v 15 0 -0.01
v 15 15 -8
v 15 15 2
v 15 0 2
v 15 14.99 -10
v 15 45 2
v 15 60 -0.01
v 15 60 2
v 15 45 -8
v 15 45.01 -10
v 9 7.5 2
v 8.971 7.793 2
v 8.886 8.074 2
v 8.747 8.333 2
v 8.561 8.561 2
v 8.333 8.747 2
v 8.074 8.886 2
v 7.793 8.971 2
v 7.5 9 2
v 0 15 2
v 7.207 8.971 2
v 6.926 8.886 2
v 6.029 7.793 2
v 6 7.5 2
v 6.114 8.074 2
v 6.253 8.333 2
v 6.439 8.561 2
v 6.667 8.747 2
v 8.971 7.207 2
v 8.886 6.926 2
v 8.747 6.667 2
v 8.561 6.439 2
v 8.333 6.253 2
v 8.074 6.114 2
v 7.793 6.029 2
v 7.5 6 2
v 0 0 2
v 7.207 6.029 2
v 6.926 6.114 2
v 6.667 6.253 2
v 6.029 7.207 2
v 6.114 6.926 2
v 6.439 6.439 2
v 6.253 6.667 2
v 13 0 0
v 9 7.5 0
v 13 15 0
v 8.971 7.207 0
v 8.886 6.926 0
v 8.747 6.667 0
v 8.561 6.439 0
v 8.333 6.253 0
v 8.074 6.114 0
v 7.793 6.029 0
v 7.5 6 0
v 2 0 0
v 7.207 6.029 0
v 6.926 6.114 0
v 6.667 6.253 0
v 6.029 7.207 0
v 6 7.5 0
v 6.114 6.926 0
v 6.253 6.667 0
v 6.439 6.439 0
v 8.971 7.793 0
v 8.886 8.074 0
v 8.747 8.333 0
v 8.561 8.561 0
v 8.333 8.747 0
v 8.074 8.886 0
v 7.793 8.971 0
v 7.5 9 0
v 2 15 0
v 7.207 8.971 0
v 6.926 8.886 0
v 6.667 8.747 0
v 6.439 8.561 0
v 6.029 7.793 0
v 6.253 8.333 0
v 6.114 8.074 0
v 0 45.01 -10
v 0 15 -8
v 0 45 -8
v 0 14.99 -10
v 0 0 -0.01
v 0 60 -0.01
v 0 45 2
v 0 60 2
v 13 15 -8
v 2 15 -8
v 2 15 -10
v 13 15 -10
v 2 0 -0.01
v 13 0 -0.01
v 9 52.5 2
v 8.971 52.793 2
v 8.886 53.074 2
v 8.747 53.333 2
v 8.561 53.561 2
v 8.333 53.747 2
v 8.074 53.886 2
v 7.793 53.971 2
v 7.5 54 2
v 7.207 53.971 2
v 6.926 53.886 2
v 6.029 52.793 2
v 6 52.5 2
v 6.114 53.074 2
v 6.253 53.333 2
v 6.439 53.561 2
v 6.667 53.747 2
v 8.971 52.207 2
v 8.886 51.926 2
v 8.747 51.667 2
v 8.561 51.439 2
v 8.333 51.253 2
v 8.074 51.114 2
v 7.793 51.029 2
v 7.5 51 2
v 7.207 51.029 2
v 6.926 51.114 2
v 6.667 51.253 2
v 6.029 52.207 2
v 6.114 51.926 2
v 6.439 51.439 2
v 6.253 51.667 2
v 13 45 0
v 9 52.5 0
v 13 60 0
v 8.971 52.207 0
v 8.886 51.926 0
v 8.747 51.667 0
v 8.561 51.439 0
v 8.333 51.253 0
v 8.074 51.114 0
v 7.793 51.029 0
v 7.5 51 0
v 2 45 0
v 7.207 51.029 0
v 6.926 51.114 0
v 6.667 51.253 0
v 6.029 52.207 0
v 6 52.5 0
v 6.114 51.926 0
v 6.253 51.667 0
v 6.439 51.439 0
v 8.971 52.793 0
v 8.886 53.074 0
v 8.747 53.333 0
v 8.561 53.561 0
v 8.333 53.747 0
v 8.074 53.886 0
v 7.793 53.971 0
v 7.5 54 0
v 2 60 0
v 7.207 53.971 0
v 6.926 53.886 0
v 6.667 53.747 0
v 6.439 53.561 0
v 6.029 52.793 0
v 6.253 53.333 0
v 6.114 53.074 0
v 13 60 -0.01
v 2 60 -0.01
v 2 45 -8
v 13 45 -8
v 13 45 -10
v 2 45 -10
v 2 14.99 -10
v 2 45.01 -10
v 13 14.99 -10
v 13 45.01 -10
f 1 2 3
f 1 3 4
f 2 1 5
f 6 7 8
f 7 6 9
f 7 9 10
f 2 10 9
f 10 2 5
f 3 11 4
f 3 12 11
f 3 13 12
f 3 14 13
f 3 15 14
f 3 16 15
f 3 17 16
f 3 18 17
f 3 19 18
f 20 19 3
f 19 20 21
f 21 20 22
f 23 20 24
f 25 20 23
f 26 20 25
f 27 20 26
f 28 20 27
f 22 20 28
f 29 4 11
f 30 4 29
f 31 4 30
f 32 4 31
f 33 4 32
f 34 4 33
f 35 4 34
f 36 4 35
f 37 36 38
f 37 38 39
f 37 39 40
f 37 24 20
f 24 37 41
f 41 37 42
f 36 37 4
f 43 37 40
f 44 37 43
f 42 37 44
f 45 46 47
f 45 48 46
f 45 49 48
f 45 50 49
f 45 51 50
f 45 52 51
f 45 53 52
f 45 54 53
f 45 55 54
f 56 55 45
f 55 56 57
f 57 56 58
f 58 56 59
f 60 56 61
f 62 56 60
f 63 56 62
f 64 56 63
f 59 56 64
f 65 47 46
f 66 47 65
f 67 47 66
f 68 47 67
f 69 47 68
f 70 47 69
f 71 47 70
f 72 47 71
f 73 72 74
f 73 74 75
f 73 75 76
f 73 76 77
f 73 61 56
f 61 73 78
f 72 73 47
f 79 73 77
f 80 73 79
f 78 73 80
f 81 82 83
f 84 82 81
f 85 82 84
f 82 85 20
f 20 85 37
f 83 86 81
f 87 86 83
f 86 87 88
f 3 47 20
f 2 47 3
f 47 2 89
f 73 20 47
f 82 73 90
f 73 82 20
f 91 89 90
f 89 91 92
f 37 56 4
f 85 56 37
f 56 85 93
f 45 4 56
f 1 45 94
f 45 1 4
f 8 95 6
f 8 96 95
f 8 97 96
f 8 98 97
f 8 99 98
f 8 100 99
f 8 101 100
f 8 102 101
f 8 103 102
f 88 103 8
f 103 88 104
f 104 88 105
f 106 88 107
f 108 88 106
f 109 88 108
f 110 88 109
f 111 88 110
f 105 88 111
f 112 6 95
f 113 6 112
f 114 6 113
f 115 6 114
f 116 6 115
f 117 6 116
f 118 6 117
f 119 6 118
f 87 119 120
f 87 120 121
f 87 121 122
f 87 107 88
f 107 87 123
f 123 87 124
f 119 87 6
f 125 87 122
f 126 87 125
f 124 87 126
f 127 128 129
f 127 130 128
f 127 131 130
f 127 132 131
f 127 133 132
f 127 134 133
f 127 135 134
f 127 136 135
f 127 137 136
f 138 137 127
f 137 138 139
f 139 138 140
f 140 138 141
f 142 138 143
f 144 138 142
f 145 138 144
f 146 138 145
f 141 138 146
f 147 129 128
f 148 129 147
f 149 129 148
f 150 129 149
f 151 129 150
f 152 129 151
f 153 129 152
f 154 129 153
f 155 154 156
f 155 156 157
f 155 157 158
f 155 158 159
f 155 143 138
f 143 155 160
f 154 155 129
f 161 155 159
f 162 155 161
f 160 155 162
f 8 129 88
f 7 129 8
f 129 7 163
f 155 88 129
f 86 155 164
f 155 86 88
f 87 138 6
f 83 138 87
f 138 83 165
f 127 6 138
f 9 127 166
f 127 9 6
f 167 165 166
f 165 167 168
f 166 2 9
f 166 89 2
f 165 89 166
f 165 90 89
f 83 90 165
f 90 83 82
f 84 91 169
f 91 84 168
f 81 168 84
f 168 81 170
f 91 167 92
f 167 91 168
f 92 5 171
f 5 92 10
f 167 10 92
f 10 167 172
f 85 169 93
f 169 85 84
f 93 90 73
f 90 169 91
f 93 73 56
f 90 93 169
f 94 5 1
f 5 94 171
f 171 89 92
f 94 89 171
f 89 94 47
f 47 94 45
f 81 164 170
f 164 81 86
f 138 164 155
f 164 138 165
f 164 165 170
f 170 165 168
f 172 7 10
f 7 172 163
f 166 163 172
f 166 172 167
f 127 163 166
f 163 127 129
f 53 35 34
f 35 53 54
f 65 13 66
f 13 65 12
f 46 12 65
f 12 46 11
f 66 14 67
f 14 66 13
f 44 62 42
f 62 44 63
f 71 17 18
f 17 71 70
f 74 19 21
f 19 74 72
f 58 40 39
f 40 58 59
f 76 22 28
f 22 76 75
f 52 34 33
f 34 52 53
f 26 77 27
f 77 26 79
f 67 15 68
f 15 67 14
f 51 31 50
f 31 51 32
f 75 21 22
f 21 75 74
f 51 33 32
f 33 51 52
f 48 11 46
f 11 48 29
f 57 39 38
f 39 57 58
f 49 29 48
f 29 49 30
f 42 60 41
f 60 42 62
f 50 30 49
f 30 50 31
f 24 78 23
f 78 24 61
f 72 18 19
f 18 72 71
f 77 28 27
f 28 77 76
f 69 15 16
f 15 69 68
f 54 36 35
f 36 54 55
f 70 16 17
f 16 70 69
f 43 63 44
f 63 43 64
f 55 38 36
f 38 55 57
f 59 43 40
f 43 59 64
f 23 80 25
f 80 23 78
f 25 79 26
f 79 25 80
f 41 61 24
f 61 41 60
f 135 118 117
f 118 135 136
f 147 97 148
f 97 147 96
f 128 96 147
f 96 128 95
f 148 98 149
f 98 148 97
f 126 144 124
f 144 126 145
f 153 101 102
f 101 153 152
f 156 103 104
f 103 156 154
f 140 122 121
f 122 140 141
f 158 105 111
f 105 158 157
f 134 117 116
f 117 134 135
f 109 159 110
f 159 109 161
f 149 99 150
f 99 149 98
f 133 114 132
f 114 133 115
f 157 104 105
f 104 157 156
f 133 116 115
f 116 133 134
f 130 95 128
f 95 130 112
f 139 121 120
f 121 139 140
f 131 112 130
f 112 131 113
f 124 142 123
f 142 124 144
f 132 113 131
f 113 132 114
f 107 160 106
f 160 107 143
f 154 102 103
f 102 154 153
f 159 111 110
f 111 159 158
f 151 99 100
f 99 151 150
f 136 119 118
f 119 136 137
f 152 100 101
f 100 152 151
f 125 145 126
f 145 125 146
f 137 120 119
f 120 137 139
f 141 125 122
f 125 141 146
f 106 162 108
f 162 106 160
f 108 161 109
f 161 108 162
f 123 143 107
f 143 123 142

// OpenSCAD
// Wire holder: two overhangs with triangular gussets connected by a bridge
// Based on 8bitdo_v013 overhang/gusset dimensions

// Overhang dimensions (from 8bitdo reference)
overhang_width = 15;
overhang_length = 15;
overhang_thickness = 2;

// Gusset dimensions
gusset_thickness = 2;
gusset_height = 10;

// Screw hole
screw_hole_d = 3;

// Bridge dimensions
bridge_span = 30;       // distance between the two overhangs
bridge_thickness = 2;
bridge_width = 15;      // same as overhang_width

// Gusset module: right-triangle brace
module gusset(length, height, thickness) {
    hull() {
        cube([thickness, 0.01, height]);
        translate([0, length - 0.01, height - 0.01])
            cube([thickness, 0.01, 0.01]);
    }
}

difference() {
    union() {
        // Left overhang (mounts to surface)
        translate([0, 0, 0])
            cube([overhang_width, overhang_length, overhang_thickness]);

        // Right overhang (mounts to surface)
        translate([0, overhang_length + bridge_span, 0])
            cube([overhang_width, overhang_length, overhang_thickness]);

        // Bridge connecting the two overhangs below
        translate([0, overhang_length, -gusset_height])
            cube([bridge_width, bridge_span, bridge_thickness]);

        // Gussets - left overhang (two gussets bracing down to bridge)
        translate([0, overhang_length, -gusset_height])
            mirror([0, 1, 0])
                gusset(overhang_length, gusset_height, gusset_thickness);
        translate([overhang_width - gusset_thickness, overhang_length, -gusset_height])
            mirror([0, 1, 0])
                gusset(overhang_length, gusset_height, gusset_thickness);

        // Gussets - right overhang (two gussets bracing down to bridge)
        translate([0, overhang_length + bridge_span, -gusset_height])
            gusset(overhang_length, gusset_height, gusset_thickness);
        translate([overhang_width - gusset_thickness, overhang_length + bridge_span, -gusset_height])
            gusset(overhang_length, gusset_height, gusset_thickness);
    }

    // Screw holes in overhang tabs
    translate([overhang_width / 2, overhang_length / 2, -1])
        cylinder(h = overhang_thickness + 2, d = screw_hole_d, $fn = 32);
    translate([overhang_width / 2, overhang_length + bridge_span + overhang_length / 2, -1])
        cylinder(h = overhang_thickness + 2, d = screw_hole_d, $fn = 32);
}
